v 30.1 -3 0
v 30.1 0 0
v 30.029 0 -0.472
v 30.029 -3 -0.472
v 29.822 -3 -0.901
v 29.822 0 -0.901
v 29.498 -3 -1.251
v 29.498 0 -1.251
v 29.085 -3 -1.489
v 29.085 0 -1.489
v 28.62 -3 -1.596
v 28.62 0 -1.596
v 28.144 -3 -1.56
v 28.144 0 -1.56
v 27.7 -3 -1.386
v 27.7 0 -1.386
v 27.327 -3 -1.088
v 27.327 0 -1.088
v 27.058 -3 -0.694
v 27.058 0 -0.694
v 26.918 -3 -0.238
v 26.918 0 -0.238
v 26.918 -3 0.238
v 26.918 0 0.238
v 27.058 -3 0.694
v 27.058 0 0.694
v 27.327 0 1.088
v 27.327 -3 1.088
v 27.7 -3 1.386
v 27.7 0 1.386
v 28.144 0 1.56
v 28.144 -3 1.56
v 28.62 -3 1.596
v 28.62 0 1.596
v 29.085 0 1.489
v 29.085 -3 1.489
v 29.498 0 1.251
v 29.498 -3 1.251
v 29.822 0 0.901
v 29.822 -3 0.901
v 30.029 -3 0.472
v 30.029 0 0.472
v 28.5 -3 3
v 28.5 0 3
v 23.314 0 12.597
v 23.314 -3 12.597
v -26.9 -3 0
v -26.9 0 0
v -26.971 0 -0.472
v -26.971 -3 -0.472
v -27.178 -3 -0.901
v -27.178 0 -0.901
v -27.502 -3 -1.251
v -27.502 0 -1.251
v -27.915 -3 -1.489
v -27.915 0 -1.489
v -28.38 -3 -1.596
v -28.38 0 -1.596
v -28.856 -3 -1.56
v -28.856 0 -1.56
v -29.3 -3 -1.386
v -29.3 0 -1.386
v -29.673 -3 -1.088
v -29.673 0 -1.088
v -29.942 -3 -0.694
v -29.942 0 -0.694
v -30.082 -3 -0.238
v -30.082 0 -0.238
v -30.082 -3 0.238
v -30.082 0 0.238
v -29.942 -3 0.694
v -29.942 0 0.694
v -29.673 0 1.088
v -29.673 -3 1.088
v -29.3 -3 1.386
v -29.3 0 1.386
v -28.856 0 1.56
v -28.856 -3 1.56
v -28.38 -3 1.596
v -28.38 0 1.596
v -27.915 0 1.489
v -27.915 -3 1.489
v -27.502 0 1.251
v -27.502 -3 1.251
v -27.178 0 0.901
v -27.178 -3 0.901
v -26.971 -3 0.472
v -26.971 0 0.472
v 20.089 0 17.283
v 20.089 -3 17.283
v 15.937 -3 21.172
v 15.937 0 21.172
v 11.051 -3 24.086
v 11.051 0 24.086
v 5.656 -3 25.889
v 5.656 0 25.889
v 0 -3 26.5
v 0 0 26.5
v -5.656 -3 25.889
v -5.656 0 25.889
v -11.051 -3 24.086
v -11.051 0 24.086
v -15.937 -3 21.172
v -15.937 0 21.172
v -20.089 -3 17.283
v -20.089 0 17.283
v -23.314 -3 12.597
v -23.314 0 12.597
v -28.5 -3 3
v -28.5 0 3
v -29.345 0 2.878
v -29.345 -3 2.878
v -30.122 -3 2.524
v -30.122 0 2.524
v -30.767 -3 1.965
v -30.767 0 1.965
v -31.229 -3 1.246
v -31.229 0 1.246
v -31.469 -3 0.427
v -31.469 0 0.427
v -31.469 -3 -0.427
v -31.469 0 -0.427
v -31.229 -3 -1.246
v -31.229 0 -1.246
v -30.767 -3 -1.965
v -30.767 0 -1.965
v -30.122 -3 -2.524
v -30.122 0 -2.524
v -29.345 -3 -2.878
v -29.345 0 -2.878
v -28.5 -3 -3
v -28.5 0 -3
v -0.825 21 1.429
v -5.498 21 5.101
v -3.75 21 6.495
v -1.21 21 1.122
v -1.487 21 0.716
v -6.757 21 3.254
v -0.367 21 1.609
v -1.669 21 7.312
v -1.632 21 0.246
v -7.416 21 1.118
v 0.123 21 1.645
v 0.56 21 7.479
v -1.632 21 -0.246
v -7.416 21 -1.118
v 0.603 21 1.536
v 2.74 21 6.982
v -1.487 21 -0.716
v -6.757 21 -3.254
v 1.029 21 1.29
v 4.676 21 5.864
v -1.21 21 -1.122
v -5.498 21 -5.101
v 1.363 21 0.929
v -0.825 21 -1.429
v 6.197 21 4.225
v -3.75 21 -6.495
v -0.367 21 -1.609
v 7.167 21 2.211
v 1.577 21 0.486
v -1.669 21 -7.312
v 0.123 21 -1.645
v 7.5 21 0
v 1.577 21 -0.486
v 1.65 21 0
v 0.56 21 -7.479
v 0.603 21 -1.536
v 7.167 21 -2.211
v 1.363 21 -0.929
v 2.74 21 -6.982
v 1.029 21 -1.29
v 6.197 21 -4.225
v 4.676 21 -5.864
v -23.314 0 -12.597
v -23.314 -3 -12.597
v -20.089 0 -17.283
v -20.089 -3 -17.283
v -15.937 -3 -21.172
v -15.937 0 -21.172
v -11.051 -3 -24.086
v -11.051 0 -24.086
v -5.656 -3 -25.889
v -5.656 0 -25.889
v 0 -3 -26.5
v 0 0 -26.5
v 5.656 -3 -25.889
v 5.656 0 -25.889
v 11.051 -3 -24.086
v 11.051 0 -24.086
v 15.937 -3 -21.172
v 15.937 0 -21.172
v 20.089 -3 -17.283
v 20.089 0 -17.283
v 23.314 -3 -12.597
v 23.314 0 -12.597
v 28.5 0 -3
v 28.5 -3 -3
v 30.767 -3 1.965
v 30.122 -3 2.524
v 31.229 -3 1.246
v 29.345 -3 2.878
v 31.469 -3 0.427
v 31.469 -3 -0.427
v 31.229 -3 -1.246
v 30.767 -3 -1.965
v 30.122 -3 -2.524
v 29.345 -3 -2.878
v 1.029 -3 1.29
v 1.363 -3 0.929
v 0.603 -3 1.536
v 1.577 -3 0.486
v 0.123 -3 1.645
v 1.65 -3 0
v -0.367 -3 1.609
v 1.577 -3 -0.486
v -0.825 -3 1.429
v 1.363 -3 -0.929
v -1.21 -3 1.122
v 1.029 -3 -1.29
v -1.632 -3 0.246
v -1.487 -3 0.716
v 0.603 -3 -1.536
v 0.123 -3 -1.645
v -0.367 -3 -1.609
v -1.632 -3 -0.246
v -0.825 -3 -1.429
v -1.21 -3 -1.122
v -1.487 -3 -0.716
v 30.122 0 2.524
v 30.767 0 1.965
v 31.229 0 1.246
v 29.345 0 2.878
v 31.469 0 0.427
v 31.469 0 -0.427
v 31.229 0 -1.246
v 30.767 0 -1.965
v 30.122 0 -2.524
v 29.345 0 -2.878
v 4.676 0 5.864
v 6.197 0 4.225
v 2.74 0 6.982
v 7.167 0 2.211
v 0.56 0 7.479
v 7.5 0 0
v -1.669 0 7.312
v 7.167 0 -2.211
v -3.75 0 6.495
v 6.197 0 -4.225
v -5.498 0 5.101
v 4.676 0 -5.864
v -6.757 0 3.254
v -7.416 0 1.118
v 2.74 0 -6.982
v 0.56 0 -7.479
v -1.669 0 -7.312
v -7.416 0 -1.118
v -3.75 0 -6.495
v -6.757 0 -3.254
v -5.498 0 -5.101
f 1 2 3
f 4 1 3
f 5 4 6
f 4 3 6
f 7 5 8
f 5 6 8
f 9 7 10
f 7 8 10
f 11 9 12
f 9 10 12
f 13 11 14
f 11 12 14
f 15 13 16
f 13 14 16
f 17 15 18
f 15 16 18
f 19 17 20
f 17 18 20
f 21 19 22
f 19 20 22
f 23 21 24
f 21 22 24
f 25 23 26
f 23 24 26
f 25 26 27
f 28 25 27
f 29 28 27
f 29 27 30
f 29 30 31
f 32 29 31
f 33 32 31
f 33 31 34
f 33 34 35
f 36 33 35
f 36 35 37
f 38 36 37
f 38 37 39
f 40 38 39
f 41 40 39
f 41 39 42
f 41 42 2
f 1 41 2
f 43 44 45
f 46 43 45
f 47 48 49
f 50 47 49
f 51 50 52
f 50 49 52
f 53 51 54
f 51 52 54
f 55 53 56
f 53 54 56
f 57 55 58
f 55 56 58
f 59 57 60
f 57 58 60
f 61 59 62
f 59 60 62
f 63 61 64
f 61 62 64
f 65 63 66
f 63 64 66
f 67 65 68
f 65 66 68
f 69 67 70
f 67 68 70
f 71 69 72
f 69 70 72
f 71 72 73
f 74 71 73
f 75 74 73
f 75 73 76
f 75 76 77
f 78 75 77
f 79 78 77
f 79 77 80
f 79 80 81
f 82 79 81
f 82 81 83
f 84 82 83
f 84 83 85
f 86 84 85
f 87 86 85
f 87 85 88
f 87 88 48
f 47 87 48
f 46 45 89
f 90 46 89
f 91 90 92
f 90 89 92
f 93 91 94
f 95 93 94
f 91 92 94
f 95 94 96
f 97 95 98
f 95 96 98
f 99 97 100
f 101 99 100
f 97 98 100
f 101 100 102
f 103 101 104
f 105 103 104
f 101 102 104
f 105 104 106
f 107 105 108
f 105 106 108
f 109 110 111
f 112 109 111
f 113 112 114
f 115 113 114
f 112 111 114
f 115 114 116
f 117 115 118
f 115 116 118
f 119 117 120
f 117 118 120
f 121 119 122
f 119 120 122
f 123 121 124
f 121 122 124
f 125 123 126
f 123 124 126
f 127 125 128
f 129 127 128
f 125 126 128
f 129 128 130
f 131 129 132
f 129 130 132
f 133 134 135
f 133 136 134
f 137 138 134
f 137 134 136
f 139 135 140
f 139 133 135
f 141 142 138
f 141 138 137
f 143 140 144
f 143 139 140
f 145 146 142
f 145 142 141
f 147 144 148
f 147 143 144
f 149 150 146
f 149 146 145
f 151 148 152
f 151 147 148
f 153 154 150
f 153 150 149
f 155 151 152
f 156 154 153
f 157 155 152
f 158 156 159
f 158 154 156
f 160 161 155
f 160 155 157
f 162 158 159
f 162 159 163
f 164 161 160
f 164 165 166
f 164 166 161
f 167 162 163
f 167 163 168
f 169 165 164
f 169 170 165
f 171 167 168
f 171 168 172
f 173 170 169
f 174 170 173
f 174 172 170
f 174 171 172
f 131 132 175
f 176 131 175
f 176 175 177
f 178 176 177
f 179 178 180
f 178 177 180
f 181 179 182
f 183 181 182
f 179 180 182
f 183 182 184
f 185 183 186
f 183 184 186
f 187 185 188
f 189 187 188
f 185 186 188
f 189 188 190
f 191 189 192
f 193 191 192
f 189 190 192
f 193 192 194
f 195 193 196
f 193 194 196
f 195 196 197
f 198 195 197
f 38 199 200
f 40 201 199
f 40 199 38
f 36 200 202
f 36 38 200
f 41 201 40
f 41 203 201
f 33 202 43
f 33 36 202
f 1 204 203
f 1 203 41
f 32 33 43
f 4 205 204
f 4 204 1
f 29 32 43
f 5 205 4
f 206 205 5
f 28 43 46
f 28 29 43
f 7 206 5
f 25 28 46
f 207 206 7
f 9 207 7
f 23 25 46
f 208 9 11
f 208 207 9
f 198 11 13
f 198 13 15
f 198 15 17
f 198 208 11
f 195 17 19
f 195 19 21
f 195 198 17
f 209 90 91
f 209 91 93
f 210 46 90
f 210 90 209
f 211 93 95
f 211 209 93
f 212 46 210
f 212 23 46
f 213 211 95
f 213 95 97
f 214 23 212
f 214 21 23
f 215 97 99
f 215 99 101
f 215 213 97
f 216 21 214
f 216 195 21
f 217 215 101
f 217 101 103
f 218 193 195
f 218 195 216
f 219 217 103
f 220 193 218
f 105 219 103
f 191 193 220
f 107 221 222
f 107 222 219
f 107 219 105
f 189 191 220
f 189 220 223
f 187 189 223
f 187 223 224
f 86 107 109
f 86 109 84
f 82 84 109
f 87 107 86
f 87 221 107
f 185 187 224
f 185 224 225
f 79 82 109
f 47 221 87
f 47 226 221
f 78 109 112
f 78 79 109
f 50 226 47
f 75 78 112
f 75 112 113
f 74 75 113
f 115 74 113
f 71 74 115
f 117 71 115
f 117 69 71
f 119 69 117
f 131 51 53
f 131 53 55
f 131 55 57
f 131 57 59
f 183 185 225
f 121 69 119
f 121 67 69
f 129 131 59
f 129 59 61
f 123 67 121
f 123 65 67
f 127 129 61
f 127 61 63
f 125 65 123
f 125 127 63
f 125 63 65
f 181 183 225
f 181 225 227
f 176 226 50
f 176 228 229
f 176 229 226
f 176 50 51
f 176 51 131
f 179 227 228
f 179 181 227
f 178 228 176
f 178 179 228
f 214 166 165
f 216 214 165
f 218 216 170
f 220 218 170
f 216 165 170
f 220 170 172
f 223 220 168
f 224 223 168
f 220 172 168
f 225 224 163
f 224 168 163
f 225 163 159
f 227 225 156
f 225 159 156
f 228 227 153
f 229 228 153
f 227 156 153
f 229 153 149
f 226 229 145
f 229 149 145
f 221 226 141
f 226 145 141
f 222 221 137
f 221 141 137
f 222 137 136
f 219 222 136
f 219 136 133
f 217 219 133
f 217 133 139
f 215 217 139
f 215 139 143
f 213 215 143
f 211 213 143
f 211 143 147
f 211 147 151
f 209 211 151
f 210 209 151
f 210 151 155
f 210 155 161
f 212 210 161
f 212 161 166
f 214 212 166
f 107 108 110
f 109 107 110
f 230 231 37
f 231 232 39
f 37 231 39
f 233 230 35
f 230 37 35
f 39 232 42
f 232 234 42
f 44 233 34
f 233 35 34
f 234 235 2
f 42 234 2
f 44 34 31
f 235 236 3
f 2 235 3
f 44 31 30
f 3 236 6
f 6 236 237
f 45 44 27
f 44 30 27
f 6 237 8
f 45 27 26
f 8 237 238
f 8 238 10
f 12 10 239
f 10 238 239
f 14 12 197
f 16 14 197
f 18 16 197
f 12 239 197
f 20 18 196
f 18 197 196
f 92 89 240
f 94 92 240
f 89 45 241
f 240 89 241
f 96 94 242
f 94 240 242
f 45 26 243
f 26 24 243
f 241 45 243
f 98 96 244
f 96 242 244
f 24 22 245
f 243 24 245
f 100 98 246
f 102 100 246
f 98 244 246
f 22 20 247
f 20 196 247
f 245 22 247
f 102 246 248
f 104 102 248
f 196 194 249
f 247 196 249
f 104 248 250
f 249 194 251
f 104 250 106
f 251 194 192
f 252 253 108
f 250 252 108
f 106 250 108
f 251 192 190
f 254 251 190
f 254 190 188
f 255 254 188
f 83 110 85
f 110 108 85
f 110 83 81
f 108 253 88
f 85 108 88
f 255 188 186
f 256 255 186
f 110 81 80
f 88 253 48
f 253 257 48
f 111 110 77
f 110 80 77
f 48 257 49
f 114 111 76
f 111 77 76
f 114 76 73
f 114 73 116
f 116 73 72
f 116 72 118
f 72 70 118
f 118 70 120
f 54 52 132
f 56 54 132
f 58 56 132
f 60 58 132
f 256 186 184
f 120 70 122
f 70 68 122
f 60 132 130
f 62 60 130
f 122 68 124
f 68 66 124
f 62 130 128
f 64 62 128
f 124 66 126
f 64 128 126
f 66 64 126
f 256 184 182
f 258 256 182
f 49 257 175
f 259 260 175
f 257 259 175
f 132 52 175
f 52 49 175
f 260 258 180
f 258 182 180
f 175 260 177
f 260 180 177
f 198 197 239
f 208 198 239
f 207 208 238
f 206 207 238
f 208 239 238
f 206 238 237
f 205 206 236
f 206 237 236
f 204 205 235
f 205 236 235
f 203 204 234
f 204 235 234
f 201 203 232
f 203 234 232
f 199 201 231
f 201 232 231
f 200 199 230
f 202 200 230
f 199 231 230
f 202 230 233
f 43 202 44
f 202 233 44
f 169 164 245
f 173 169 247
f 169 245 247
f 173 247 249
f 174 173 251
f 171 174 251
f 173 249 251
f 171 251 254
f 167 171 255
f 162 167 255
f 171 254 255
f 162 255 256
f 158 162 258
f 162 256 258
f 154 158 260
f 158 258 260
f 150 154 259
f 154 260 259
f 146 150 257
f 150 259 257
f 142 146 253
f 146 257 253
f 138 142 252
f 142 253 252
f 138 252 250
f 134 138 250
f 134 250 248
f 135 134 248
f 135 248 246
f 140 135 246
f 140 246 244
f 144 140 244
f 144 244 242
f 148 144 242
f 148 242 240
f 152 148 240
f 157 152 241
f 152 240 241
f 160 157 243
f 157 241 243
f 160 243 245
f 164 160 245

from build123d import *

# Parameters (mm, degrees)
BOSS_EXTRUDE1_DEPTH      = 3
SKETCH2_R                = 7.5
BOSS_EXTRUDE2_DEPTH      = 21
M3_CLEARANCE_HOLE1_D     = 3.2
M3_CLEARANCE_HOLE1_DEPTH = 3
SKETCH5_R                = 1.65
CUT_EXTRUDE1_DEPTH       = 25


with BuildPart() as part:
    # Sketch1 → Boss-Extrude1 (new body)
    with BuildSketch(Plane(origin=(0, 0, 0), x_dir=(1, 0, 0), z_dir=(0, 1, 0))):
        with BuildLine():
            Line((-28.5, 3), (-23.314316453, 12.597327031))
            ThreePointArc((-23.314316453, 12.597327031), (0, 26.5), (23.314316453, 12.597327031))
            Line((23.314316453, 12.597327031), (28.5, 3))
            ThreePointArc((28.5, 3), (31.5, 0), (28.5, -3))
            Line((28.5, -3), (23.314316453, -12.597327031))
            ThreePointArc((23.314316453, -12.597327031), (0, -26.5), (-23.314316453, -12.597327031))
            Line((-23.314316453, -12.597327031), (-28.5, -3))
            ThreePointArc((-28.5, -3), (-31.5, 0), (-28.5, 3))
        make_face()
    extrude(amount=-BOSS_EXTRUDE1_DEPTH)

    # Sketch2 → Boss-Extrude2 (add)
    with BuildSketch(Plane(origin=(0, 0, 0), x_dir=(1, 0, 0), z_dir=(0, 1, 0))):
        Circle(SKETCH2_R)
    extrude(amount=BOSS_EXTRUDE2_DEPTH)

    # M3 Clearance Hole1
    with Locations(Plane(origin=(0, -3, 0), x_dir=(-1, 0, 0), z_dir=(0, -1, 0))):
        with Locations((-28.5, 0), (28.5, 0)):
            Hole(M3_CLEARANCE_HOLE1_D / 2, depth=M3_CLEARANCE_HOLE1_DEPTH)

    # Sketch5 → Cut-Extrude1 (cut, through all)
    with BuildSketch(Plane(origin=(0, 21, 0), x_dir=(1, 0, 0), z_dir=(0, 1, 0))):
        Circle(SKETCH5_R)
    extrude(amount=-CUT_EXTRUDE1_DEPTH, mode=Mode.SUBTRACT)


solid = part.part
